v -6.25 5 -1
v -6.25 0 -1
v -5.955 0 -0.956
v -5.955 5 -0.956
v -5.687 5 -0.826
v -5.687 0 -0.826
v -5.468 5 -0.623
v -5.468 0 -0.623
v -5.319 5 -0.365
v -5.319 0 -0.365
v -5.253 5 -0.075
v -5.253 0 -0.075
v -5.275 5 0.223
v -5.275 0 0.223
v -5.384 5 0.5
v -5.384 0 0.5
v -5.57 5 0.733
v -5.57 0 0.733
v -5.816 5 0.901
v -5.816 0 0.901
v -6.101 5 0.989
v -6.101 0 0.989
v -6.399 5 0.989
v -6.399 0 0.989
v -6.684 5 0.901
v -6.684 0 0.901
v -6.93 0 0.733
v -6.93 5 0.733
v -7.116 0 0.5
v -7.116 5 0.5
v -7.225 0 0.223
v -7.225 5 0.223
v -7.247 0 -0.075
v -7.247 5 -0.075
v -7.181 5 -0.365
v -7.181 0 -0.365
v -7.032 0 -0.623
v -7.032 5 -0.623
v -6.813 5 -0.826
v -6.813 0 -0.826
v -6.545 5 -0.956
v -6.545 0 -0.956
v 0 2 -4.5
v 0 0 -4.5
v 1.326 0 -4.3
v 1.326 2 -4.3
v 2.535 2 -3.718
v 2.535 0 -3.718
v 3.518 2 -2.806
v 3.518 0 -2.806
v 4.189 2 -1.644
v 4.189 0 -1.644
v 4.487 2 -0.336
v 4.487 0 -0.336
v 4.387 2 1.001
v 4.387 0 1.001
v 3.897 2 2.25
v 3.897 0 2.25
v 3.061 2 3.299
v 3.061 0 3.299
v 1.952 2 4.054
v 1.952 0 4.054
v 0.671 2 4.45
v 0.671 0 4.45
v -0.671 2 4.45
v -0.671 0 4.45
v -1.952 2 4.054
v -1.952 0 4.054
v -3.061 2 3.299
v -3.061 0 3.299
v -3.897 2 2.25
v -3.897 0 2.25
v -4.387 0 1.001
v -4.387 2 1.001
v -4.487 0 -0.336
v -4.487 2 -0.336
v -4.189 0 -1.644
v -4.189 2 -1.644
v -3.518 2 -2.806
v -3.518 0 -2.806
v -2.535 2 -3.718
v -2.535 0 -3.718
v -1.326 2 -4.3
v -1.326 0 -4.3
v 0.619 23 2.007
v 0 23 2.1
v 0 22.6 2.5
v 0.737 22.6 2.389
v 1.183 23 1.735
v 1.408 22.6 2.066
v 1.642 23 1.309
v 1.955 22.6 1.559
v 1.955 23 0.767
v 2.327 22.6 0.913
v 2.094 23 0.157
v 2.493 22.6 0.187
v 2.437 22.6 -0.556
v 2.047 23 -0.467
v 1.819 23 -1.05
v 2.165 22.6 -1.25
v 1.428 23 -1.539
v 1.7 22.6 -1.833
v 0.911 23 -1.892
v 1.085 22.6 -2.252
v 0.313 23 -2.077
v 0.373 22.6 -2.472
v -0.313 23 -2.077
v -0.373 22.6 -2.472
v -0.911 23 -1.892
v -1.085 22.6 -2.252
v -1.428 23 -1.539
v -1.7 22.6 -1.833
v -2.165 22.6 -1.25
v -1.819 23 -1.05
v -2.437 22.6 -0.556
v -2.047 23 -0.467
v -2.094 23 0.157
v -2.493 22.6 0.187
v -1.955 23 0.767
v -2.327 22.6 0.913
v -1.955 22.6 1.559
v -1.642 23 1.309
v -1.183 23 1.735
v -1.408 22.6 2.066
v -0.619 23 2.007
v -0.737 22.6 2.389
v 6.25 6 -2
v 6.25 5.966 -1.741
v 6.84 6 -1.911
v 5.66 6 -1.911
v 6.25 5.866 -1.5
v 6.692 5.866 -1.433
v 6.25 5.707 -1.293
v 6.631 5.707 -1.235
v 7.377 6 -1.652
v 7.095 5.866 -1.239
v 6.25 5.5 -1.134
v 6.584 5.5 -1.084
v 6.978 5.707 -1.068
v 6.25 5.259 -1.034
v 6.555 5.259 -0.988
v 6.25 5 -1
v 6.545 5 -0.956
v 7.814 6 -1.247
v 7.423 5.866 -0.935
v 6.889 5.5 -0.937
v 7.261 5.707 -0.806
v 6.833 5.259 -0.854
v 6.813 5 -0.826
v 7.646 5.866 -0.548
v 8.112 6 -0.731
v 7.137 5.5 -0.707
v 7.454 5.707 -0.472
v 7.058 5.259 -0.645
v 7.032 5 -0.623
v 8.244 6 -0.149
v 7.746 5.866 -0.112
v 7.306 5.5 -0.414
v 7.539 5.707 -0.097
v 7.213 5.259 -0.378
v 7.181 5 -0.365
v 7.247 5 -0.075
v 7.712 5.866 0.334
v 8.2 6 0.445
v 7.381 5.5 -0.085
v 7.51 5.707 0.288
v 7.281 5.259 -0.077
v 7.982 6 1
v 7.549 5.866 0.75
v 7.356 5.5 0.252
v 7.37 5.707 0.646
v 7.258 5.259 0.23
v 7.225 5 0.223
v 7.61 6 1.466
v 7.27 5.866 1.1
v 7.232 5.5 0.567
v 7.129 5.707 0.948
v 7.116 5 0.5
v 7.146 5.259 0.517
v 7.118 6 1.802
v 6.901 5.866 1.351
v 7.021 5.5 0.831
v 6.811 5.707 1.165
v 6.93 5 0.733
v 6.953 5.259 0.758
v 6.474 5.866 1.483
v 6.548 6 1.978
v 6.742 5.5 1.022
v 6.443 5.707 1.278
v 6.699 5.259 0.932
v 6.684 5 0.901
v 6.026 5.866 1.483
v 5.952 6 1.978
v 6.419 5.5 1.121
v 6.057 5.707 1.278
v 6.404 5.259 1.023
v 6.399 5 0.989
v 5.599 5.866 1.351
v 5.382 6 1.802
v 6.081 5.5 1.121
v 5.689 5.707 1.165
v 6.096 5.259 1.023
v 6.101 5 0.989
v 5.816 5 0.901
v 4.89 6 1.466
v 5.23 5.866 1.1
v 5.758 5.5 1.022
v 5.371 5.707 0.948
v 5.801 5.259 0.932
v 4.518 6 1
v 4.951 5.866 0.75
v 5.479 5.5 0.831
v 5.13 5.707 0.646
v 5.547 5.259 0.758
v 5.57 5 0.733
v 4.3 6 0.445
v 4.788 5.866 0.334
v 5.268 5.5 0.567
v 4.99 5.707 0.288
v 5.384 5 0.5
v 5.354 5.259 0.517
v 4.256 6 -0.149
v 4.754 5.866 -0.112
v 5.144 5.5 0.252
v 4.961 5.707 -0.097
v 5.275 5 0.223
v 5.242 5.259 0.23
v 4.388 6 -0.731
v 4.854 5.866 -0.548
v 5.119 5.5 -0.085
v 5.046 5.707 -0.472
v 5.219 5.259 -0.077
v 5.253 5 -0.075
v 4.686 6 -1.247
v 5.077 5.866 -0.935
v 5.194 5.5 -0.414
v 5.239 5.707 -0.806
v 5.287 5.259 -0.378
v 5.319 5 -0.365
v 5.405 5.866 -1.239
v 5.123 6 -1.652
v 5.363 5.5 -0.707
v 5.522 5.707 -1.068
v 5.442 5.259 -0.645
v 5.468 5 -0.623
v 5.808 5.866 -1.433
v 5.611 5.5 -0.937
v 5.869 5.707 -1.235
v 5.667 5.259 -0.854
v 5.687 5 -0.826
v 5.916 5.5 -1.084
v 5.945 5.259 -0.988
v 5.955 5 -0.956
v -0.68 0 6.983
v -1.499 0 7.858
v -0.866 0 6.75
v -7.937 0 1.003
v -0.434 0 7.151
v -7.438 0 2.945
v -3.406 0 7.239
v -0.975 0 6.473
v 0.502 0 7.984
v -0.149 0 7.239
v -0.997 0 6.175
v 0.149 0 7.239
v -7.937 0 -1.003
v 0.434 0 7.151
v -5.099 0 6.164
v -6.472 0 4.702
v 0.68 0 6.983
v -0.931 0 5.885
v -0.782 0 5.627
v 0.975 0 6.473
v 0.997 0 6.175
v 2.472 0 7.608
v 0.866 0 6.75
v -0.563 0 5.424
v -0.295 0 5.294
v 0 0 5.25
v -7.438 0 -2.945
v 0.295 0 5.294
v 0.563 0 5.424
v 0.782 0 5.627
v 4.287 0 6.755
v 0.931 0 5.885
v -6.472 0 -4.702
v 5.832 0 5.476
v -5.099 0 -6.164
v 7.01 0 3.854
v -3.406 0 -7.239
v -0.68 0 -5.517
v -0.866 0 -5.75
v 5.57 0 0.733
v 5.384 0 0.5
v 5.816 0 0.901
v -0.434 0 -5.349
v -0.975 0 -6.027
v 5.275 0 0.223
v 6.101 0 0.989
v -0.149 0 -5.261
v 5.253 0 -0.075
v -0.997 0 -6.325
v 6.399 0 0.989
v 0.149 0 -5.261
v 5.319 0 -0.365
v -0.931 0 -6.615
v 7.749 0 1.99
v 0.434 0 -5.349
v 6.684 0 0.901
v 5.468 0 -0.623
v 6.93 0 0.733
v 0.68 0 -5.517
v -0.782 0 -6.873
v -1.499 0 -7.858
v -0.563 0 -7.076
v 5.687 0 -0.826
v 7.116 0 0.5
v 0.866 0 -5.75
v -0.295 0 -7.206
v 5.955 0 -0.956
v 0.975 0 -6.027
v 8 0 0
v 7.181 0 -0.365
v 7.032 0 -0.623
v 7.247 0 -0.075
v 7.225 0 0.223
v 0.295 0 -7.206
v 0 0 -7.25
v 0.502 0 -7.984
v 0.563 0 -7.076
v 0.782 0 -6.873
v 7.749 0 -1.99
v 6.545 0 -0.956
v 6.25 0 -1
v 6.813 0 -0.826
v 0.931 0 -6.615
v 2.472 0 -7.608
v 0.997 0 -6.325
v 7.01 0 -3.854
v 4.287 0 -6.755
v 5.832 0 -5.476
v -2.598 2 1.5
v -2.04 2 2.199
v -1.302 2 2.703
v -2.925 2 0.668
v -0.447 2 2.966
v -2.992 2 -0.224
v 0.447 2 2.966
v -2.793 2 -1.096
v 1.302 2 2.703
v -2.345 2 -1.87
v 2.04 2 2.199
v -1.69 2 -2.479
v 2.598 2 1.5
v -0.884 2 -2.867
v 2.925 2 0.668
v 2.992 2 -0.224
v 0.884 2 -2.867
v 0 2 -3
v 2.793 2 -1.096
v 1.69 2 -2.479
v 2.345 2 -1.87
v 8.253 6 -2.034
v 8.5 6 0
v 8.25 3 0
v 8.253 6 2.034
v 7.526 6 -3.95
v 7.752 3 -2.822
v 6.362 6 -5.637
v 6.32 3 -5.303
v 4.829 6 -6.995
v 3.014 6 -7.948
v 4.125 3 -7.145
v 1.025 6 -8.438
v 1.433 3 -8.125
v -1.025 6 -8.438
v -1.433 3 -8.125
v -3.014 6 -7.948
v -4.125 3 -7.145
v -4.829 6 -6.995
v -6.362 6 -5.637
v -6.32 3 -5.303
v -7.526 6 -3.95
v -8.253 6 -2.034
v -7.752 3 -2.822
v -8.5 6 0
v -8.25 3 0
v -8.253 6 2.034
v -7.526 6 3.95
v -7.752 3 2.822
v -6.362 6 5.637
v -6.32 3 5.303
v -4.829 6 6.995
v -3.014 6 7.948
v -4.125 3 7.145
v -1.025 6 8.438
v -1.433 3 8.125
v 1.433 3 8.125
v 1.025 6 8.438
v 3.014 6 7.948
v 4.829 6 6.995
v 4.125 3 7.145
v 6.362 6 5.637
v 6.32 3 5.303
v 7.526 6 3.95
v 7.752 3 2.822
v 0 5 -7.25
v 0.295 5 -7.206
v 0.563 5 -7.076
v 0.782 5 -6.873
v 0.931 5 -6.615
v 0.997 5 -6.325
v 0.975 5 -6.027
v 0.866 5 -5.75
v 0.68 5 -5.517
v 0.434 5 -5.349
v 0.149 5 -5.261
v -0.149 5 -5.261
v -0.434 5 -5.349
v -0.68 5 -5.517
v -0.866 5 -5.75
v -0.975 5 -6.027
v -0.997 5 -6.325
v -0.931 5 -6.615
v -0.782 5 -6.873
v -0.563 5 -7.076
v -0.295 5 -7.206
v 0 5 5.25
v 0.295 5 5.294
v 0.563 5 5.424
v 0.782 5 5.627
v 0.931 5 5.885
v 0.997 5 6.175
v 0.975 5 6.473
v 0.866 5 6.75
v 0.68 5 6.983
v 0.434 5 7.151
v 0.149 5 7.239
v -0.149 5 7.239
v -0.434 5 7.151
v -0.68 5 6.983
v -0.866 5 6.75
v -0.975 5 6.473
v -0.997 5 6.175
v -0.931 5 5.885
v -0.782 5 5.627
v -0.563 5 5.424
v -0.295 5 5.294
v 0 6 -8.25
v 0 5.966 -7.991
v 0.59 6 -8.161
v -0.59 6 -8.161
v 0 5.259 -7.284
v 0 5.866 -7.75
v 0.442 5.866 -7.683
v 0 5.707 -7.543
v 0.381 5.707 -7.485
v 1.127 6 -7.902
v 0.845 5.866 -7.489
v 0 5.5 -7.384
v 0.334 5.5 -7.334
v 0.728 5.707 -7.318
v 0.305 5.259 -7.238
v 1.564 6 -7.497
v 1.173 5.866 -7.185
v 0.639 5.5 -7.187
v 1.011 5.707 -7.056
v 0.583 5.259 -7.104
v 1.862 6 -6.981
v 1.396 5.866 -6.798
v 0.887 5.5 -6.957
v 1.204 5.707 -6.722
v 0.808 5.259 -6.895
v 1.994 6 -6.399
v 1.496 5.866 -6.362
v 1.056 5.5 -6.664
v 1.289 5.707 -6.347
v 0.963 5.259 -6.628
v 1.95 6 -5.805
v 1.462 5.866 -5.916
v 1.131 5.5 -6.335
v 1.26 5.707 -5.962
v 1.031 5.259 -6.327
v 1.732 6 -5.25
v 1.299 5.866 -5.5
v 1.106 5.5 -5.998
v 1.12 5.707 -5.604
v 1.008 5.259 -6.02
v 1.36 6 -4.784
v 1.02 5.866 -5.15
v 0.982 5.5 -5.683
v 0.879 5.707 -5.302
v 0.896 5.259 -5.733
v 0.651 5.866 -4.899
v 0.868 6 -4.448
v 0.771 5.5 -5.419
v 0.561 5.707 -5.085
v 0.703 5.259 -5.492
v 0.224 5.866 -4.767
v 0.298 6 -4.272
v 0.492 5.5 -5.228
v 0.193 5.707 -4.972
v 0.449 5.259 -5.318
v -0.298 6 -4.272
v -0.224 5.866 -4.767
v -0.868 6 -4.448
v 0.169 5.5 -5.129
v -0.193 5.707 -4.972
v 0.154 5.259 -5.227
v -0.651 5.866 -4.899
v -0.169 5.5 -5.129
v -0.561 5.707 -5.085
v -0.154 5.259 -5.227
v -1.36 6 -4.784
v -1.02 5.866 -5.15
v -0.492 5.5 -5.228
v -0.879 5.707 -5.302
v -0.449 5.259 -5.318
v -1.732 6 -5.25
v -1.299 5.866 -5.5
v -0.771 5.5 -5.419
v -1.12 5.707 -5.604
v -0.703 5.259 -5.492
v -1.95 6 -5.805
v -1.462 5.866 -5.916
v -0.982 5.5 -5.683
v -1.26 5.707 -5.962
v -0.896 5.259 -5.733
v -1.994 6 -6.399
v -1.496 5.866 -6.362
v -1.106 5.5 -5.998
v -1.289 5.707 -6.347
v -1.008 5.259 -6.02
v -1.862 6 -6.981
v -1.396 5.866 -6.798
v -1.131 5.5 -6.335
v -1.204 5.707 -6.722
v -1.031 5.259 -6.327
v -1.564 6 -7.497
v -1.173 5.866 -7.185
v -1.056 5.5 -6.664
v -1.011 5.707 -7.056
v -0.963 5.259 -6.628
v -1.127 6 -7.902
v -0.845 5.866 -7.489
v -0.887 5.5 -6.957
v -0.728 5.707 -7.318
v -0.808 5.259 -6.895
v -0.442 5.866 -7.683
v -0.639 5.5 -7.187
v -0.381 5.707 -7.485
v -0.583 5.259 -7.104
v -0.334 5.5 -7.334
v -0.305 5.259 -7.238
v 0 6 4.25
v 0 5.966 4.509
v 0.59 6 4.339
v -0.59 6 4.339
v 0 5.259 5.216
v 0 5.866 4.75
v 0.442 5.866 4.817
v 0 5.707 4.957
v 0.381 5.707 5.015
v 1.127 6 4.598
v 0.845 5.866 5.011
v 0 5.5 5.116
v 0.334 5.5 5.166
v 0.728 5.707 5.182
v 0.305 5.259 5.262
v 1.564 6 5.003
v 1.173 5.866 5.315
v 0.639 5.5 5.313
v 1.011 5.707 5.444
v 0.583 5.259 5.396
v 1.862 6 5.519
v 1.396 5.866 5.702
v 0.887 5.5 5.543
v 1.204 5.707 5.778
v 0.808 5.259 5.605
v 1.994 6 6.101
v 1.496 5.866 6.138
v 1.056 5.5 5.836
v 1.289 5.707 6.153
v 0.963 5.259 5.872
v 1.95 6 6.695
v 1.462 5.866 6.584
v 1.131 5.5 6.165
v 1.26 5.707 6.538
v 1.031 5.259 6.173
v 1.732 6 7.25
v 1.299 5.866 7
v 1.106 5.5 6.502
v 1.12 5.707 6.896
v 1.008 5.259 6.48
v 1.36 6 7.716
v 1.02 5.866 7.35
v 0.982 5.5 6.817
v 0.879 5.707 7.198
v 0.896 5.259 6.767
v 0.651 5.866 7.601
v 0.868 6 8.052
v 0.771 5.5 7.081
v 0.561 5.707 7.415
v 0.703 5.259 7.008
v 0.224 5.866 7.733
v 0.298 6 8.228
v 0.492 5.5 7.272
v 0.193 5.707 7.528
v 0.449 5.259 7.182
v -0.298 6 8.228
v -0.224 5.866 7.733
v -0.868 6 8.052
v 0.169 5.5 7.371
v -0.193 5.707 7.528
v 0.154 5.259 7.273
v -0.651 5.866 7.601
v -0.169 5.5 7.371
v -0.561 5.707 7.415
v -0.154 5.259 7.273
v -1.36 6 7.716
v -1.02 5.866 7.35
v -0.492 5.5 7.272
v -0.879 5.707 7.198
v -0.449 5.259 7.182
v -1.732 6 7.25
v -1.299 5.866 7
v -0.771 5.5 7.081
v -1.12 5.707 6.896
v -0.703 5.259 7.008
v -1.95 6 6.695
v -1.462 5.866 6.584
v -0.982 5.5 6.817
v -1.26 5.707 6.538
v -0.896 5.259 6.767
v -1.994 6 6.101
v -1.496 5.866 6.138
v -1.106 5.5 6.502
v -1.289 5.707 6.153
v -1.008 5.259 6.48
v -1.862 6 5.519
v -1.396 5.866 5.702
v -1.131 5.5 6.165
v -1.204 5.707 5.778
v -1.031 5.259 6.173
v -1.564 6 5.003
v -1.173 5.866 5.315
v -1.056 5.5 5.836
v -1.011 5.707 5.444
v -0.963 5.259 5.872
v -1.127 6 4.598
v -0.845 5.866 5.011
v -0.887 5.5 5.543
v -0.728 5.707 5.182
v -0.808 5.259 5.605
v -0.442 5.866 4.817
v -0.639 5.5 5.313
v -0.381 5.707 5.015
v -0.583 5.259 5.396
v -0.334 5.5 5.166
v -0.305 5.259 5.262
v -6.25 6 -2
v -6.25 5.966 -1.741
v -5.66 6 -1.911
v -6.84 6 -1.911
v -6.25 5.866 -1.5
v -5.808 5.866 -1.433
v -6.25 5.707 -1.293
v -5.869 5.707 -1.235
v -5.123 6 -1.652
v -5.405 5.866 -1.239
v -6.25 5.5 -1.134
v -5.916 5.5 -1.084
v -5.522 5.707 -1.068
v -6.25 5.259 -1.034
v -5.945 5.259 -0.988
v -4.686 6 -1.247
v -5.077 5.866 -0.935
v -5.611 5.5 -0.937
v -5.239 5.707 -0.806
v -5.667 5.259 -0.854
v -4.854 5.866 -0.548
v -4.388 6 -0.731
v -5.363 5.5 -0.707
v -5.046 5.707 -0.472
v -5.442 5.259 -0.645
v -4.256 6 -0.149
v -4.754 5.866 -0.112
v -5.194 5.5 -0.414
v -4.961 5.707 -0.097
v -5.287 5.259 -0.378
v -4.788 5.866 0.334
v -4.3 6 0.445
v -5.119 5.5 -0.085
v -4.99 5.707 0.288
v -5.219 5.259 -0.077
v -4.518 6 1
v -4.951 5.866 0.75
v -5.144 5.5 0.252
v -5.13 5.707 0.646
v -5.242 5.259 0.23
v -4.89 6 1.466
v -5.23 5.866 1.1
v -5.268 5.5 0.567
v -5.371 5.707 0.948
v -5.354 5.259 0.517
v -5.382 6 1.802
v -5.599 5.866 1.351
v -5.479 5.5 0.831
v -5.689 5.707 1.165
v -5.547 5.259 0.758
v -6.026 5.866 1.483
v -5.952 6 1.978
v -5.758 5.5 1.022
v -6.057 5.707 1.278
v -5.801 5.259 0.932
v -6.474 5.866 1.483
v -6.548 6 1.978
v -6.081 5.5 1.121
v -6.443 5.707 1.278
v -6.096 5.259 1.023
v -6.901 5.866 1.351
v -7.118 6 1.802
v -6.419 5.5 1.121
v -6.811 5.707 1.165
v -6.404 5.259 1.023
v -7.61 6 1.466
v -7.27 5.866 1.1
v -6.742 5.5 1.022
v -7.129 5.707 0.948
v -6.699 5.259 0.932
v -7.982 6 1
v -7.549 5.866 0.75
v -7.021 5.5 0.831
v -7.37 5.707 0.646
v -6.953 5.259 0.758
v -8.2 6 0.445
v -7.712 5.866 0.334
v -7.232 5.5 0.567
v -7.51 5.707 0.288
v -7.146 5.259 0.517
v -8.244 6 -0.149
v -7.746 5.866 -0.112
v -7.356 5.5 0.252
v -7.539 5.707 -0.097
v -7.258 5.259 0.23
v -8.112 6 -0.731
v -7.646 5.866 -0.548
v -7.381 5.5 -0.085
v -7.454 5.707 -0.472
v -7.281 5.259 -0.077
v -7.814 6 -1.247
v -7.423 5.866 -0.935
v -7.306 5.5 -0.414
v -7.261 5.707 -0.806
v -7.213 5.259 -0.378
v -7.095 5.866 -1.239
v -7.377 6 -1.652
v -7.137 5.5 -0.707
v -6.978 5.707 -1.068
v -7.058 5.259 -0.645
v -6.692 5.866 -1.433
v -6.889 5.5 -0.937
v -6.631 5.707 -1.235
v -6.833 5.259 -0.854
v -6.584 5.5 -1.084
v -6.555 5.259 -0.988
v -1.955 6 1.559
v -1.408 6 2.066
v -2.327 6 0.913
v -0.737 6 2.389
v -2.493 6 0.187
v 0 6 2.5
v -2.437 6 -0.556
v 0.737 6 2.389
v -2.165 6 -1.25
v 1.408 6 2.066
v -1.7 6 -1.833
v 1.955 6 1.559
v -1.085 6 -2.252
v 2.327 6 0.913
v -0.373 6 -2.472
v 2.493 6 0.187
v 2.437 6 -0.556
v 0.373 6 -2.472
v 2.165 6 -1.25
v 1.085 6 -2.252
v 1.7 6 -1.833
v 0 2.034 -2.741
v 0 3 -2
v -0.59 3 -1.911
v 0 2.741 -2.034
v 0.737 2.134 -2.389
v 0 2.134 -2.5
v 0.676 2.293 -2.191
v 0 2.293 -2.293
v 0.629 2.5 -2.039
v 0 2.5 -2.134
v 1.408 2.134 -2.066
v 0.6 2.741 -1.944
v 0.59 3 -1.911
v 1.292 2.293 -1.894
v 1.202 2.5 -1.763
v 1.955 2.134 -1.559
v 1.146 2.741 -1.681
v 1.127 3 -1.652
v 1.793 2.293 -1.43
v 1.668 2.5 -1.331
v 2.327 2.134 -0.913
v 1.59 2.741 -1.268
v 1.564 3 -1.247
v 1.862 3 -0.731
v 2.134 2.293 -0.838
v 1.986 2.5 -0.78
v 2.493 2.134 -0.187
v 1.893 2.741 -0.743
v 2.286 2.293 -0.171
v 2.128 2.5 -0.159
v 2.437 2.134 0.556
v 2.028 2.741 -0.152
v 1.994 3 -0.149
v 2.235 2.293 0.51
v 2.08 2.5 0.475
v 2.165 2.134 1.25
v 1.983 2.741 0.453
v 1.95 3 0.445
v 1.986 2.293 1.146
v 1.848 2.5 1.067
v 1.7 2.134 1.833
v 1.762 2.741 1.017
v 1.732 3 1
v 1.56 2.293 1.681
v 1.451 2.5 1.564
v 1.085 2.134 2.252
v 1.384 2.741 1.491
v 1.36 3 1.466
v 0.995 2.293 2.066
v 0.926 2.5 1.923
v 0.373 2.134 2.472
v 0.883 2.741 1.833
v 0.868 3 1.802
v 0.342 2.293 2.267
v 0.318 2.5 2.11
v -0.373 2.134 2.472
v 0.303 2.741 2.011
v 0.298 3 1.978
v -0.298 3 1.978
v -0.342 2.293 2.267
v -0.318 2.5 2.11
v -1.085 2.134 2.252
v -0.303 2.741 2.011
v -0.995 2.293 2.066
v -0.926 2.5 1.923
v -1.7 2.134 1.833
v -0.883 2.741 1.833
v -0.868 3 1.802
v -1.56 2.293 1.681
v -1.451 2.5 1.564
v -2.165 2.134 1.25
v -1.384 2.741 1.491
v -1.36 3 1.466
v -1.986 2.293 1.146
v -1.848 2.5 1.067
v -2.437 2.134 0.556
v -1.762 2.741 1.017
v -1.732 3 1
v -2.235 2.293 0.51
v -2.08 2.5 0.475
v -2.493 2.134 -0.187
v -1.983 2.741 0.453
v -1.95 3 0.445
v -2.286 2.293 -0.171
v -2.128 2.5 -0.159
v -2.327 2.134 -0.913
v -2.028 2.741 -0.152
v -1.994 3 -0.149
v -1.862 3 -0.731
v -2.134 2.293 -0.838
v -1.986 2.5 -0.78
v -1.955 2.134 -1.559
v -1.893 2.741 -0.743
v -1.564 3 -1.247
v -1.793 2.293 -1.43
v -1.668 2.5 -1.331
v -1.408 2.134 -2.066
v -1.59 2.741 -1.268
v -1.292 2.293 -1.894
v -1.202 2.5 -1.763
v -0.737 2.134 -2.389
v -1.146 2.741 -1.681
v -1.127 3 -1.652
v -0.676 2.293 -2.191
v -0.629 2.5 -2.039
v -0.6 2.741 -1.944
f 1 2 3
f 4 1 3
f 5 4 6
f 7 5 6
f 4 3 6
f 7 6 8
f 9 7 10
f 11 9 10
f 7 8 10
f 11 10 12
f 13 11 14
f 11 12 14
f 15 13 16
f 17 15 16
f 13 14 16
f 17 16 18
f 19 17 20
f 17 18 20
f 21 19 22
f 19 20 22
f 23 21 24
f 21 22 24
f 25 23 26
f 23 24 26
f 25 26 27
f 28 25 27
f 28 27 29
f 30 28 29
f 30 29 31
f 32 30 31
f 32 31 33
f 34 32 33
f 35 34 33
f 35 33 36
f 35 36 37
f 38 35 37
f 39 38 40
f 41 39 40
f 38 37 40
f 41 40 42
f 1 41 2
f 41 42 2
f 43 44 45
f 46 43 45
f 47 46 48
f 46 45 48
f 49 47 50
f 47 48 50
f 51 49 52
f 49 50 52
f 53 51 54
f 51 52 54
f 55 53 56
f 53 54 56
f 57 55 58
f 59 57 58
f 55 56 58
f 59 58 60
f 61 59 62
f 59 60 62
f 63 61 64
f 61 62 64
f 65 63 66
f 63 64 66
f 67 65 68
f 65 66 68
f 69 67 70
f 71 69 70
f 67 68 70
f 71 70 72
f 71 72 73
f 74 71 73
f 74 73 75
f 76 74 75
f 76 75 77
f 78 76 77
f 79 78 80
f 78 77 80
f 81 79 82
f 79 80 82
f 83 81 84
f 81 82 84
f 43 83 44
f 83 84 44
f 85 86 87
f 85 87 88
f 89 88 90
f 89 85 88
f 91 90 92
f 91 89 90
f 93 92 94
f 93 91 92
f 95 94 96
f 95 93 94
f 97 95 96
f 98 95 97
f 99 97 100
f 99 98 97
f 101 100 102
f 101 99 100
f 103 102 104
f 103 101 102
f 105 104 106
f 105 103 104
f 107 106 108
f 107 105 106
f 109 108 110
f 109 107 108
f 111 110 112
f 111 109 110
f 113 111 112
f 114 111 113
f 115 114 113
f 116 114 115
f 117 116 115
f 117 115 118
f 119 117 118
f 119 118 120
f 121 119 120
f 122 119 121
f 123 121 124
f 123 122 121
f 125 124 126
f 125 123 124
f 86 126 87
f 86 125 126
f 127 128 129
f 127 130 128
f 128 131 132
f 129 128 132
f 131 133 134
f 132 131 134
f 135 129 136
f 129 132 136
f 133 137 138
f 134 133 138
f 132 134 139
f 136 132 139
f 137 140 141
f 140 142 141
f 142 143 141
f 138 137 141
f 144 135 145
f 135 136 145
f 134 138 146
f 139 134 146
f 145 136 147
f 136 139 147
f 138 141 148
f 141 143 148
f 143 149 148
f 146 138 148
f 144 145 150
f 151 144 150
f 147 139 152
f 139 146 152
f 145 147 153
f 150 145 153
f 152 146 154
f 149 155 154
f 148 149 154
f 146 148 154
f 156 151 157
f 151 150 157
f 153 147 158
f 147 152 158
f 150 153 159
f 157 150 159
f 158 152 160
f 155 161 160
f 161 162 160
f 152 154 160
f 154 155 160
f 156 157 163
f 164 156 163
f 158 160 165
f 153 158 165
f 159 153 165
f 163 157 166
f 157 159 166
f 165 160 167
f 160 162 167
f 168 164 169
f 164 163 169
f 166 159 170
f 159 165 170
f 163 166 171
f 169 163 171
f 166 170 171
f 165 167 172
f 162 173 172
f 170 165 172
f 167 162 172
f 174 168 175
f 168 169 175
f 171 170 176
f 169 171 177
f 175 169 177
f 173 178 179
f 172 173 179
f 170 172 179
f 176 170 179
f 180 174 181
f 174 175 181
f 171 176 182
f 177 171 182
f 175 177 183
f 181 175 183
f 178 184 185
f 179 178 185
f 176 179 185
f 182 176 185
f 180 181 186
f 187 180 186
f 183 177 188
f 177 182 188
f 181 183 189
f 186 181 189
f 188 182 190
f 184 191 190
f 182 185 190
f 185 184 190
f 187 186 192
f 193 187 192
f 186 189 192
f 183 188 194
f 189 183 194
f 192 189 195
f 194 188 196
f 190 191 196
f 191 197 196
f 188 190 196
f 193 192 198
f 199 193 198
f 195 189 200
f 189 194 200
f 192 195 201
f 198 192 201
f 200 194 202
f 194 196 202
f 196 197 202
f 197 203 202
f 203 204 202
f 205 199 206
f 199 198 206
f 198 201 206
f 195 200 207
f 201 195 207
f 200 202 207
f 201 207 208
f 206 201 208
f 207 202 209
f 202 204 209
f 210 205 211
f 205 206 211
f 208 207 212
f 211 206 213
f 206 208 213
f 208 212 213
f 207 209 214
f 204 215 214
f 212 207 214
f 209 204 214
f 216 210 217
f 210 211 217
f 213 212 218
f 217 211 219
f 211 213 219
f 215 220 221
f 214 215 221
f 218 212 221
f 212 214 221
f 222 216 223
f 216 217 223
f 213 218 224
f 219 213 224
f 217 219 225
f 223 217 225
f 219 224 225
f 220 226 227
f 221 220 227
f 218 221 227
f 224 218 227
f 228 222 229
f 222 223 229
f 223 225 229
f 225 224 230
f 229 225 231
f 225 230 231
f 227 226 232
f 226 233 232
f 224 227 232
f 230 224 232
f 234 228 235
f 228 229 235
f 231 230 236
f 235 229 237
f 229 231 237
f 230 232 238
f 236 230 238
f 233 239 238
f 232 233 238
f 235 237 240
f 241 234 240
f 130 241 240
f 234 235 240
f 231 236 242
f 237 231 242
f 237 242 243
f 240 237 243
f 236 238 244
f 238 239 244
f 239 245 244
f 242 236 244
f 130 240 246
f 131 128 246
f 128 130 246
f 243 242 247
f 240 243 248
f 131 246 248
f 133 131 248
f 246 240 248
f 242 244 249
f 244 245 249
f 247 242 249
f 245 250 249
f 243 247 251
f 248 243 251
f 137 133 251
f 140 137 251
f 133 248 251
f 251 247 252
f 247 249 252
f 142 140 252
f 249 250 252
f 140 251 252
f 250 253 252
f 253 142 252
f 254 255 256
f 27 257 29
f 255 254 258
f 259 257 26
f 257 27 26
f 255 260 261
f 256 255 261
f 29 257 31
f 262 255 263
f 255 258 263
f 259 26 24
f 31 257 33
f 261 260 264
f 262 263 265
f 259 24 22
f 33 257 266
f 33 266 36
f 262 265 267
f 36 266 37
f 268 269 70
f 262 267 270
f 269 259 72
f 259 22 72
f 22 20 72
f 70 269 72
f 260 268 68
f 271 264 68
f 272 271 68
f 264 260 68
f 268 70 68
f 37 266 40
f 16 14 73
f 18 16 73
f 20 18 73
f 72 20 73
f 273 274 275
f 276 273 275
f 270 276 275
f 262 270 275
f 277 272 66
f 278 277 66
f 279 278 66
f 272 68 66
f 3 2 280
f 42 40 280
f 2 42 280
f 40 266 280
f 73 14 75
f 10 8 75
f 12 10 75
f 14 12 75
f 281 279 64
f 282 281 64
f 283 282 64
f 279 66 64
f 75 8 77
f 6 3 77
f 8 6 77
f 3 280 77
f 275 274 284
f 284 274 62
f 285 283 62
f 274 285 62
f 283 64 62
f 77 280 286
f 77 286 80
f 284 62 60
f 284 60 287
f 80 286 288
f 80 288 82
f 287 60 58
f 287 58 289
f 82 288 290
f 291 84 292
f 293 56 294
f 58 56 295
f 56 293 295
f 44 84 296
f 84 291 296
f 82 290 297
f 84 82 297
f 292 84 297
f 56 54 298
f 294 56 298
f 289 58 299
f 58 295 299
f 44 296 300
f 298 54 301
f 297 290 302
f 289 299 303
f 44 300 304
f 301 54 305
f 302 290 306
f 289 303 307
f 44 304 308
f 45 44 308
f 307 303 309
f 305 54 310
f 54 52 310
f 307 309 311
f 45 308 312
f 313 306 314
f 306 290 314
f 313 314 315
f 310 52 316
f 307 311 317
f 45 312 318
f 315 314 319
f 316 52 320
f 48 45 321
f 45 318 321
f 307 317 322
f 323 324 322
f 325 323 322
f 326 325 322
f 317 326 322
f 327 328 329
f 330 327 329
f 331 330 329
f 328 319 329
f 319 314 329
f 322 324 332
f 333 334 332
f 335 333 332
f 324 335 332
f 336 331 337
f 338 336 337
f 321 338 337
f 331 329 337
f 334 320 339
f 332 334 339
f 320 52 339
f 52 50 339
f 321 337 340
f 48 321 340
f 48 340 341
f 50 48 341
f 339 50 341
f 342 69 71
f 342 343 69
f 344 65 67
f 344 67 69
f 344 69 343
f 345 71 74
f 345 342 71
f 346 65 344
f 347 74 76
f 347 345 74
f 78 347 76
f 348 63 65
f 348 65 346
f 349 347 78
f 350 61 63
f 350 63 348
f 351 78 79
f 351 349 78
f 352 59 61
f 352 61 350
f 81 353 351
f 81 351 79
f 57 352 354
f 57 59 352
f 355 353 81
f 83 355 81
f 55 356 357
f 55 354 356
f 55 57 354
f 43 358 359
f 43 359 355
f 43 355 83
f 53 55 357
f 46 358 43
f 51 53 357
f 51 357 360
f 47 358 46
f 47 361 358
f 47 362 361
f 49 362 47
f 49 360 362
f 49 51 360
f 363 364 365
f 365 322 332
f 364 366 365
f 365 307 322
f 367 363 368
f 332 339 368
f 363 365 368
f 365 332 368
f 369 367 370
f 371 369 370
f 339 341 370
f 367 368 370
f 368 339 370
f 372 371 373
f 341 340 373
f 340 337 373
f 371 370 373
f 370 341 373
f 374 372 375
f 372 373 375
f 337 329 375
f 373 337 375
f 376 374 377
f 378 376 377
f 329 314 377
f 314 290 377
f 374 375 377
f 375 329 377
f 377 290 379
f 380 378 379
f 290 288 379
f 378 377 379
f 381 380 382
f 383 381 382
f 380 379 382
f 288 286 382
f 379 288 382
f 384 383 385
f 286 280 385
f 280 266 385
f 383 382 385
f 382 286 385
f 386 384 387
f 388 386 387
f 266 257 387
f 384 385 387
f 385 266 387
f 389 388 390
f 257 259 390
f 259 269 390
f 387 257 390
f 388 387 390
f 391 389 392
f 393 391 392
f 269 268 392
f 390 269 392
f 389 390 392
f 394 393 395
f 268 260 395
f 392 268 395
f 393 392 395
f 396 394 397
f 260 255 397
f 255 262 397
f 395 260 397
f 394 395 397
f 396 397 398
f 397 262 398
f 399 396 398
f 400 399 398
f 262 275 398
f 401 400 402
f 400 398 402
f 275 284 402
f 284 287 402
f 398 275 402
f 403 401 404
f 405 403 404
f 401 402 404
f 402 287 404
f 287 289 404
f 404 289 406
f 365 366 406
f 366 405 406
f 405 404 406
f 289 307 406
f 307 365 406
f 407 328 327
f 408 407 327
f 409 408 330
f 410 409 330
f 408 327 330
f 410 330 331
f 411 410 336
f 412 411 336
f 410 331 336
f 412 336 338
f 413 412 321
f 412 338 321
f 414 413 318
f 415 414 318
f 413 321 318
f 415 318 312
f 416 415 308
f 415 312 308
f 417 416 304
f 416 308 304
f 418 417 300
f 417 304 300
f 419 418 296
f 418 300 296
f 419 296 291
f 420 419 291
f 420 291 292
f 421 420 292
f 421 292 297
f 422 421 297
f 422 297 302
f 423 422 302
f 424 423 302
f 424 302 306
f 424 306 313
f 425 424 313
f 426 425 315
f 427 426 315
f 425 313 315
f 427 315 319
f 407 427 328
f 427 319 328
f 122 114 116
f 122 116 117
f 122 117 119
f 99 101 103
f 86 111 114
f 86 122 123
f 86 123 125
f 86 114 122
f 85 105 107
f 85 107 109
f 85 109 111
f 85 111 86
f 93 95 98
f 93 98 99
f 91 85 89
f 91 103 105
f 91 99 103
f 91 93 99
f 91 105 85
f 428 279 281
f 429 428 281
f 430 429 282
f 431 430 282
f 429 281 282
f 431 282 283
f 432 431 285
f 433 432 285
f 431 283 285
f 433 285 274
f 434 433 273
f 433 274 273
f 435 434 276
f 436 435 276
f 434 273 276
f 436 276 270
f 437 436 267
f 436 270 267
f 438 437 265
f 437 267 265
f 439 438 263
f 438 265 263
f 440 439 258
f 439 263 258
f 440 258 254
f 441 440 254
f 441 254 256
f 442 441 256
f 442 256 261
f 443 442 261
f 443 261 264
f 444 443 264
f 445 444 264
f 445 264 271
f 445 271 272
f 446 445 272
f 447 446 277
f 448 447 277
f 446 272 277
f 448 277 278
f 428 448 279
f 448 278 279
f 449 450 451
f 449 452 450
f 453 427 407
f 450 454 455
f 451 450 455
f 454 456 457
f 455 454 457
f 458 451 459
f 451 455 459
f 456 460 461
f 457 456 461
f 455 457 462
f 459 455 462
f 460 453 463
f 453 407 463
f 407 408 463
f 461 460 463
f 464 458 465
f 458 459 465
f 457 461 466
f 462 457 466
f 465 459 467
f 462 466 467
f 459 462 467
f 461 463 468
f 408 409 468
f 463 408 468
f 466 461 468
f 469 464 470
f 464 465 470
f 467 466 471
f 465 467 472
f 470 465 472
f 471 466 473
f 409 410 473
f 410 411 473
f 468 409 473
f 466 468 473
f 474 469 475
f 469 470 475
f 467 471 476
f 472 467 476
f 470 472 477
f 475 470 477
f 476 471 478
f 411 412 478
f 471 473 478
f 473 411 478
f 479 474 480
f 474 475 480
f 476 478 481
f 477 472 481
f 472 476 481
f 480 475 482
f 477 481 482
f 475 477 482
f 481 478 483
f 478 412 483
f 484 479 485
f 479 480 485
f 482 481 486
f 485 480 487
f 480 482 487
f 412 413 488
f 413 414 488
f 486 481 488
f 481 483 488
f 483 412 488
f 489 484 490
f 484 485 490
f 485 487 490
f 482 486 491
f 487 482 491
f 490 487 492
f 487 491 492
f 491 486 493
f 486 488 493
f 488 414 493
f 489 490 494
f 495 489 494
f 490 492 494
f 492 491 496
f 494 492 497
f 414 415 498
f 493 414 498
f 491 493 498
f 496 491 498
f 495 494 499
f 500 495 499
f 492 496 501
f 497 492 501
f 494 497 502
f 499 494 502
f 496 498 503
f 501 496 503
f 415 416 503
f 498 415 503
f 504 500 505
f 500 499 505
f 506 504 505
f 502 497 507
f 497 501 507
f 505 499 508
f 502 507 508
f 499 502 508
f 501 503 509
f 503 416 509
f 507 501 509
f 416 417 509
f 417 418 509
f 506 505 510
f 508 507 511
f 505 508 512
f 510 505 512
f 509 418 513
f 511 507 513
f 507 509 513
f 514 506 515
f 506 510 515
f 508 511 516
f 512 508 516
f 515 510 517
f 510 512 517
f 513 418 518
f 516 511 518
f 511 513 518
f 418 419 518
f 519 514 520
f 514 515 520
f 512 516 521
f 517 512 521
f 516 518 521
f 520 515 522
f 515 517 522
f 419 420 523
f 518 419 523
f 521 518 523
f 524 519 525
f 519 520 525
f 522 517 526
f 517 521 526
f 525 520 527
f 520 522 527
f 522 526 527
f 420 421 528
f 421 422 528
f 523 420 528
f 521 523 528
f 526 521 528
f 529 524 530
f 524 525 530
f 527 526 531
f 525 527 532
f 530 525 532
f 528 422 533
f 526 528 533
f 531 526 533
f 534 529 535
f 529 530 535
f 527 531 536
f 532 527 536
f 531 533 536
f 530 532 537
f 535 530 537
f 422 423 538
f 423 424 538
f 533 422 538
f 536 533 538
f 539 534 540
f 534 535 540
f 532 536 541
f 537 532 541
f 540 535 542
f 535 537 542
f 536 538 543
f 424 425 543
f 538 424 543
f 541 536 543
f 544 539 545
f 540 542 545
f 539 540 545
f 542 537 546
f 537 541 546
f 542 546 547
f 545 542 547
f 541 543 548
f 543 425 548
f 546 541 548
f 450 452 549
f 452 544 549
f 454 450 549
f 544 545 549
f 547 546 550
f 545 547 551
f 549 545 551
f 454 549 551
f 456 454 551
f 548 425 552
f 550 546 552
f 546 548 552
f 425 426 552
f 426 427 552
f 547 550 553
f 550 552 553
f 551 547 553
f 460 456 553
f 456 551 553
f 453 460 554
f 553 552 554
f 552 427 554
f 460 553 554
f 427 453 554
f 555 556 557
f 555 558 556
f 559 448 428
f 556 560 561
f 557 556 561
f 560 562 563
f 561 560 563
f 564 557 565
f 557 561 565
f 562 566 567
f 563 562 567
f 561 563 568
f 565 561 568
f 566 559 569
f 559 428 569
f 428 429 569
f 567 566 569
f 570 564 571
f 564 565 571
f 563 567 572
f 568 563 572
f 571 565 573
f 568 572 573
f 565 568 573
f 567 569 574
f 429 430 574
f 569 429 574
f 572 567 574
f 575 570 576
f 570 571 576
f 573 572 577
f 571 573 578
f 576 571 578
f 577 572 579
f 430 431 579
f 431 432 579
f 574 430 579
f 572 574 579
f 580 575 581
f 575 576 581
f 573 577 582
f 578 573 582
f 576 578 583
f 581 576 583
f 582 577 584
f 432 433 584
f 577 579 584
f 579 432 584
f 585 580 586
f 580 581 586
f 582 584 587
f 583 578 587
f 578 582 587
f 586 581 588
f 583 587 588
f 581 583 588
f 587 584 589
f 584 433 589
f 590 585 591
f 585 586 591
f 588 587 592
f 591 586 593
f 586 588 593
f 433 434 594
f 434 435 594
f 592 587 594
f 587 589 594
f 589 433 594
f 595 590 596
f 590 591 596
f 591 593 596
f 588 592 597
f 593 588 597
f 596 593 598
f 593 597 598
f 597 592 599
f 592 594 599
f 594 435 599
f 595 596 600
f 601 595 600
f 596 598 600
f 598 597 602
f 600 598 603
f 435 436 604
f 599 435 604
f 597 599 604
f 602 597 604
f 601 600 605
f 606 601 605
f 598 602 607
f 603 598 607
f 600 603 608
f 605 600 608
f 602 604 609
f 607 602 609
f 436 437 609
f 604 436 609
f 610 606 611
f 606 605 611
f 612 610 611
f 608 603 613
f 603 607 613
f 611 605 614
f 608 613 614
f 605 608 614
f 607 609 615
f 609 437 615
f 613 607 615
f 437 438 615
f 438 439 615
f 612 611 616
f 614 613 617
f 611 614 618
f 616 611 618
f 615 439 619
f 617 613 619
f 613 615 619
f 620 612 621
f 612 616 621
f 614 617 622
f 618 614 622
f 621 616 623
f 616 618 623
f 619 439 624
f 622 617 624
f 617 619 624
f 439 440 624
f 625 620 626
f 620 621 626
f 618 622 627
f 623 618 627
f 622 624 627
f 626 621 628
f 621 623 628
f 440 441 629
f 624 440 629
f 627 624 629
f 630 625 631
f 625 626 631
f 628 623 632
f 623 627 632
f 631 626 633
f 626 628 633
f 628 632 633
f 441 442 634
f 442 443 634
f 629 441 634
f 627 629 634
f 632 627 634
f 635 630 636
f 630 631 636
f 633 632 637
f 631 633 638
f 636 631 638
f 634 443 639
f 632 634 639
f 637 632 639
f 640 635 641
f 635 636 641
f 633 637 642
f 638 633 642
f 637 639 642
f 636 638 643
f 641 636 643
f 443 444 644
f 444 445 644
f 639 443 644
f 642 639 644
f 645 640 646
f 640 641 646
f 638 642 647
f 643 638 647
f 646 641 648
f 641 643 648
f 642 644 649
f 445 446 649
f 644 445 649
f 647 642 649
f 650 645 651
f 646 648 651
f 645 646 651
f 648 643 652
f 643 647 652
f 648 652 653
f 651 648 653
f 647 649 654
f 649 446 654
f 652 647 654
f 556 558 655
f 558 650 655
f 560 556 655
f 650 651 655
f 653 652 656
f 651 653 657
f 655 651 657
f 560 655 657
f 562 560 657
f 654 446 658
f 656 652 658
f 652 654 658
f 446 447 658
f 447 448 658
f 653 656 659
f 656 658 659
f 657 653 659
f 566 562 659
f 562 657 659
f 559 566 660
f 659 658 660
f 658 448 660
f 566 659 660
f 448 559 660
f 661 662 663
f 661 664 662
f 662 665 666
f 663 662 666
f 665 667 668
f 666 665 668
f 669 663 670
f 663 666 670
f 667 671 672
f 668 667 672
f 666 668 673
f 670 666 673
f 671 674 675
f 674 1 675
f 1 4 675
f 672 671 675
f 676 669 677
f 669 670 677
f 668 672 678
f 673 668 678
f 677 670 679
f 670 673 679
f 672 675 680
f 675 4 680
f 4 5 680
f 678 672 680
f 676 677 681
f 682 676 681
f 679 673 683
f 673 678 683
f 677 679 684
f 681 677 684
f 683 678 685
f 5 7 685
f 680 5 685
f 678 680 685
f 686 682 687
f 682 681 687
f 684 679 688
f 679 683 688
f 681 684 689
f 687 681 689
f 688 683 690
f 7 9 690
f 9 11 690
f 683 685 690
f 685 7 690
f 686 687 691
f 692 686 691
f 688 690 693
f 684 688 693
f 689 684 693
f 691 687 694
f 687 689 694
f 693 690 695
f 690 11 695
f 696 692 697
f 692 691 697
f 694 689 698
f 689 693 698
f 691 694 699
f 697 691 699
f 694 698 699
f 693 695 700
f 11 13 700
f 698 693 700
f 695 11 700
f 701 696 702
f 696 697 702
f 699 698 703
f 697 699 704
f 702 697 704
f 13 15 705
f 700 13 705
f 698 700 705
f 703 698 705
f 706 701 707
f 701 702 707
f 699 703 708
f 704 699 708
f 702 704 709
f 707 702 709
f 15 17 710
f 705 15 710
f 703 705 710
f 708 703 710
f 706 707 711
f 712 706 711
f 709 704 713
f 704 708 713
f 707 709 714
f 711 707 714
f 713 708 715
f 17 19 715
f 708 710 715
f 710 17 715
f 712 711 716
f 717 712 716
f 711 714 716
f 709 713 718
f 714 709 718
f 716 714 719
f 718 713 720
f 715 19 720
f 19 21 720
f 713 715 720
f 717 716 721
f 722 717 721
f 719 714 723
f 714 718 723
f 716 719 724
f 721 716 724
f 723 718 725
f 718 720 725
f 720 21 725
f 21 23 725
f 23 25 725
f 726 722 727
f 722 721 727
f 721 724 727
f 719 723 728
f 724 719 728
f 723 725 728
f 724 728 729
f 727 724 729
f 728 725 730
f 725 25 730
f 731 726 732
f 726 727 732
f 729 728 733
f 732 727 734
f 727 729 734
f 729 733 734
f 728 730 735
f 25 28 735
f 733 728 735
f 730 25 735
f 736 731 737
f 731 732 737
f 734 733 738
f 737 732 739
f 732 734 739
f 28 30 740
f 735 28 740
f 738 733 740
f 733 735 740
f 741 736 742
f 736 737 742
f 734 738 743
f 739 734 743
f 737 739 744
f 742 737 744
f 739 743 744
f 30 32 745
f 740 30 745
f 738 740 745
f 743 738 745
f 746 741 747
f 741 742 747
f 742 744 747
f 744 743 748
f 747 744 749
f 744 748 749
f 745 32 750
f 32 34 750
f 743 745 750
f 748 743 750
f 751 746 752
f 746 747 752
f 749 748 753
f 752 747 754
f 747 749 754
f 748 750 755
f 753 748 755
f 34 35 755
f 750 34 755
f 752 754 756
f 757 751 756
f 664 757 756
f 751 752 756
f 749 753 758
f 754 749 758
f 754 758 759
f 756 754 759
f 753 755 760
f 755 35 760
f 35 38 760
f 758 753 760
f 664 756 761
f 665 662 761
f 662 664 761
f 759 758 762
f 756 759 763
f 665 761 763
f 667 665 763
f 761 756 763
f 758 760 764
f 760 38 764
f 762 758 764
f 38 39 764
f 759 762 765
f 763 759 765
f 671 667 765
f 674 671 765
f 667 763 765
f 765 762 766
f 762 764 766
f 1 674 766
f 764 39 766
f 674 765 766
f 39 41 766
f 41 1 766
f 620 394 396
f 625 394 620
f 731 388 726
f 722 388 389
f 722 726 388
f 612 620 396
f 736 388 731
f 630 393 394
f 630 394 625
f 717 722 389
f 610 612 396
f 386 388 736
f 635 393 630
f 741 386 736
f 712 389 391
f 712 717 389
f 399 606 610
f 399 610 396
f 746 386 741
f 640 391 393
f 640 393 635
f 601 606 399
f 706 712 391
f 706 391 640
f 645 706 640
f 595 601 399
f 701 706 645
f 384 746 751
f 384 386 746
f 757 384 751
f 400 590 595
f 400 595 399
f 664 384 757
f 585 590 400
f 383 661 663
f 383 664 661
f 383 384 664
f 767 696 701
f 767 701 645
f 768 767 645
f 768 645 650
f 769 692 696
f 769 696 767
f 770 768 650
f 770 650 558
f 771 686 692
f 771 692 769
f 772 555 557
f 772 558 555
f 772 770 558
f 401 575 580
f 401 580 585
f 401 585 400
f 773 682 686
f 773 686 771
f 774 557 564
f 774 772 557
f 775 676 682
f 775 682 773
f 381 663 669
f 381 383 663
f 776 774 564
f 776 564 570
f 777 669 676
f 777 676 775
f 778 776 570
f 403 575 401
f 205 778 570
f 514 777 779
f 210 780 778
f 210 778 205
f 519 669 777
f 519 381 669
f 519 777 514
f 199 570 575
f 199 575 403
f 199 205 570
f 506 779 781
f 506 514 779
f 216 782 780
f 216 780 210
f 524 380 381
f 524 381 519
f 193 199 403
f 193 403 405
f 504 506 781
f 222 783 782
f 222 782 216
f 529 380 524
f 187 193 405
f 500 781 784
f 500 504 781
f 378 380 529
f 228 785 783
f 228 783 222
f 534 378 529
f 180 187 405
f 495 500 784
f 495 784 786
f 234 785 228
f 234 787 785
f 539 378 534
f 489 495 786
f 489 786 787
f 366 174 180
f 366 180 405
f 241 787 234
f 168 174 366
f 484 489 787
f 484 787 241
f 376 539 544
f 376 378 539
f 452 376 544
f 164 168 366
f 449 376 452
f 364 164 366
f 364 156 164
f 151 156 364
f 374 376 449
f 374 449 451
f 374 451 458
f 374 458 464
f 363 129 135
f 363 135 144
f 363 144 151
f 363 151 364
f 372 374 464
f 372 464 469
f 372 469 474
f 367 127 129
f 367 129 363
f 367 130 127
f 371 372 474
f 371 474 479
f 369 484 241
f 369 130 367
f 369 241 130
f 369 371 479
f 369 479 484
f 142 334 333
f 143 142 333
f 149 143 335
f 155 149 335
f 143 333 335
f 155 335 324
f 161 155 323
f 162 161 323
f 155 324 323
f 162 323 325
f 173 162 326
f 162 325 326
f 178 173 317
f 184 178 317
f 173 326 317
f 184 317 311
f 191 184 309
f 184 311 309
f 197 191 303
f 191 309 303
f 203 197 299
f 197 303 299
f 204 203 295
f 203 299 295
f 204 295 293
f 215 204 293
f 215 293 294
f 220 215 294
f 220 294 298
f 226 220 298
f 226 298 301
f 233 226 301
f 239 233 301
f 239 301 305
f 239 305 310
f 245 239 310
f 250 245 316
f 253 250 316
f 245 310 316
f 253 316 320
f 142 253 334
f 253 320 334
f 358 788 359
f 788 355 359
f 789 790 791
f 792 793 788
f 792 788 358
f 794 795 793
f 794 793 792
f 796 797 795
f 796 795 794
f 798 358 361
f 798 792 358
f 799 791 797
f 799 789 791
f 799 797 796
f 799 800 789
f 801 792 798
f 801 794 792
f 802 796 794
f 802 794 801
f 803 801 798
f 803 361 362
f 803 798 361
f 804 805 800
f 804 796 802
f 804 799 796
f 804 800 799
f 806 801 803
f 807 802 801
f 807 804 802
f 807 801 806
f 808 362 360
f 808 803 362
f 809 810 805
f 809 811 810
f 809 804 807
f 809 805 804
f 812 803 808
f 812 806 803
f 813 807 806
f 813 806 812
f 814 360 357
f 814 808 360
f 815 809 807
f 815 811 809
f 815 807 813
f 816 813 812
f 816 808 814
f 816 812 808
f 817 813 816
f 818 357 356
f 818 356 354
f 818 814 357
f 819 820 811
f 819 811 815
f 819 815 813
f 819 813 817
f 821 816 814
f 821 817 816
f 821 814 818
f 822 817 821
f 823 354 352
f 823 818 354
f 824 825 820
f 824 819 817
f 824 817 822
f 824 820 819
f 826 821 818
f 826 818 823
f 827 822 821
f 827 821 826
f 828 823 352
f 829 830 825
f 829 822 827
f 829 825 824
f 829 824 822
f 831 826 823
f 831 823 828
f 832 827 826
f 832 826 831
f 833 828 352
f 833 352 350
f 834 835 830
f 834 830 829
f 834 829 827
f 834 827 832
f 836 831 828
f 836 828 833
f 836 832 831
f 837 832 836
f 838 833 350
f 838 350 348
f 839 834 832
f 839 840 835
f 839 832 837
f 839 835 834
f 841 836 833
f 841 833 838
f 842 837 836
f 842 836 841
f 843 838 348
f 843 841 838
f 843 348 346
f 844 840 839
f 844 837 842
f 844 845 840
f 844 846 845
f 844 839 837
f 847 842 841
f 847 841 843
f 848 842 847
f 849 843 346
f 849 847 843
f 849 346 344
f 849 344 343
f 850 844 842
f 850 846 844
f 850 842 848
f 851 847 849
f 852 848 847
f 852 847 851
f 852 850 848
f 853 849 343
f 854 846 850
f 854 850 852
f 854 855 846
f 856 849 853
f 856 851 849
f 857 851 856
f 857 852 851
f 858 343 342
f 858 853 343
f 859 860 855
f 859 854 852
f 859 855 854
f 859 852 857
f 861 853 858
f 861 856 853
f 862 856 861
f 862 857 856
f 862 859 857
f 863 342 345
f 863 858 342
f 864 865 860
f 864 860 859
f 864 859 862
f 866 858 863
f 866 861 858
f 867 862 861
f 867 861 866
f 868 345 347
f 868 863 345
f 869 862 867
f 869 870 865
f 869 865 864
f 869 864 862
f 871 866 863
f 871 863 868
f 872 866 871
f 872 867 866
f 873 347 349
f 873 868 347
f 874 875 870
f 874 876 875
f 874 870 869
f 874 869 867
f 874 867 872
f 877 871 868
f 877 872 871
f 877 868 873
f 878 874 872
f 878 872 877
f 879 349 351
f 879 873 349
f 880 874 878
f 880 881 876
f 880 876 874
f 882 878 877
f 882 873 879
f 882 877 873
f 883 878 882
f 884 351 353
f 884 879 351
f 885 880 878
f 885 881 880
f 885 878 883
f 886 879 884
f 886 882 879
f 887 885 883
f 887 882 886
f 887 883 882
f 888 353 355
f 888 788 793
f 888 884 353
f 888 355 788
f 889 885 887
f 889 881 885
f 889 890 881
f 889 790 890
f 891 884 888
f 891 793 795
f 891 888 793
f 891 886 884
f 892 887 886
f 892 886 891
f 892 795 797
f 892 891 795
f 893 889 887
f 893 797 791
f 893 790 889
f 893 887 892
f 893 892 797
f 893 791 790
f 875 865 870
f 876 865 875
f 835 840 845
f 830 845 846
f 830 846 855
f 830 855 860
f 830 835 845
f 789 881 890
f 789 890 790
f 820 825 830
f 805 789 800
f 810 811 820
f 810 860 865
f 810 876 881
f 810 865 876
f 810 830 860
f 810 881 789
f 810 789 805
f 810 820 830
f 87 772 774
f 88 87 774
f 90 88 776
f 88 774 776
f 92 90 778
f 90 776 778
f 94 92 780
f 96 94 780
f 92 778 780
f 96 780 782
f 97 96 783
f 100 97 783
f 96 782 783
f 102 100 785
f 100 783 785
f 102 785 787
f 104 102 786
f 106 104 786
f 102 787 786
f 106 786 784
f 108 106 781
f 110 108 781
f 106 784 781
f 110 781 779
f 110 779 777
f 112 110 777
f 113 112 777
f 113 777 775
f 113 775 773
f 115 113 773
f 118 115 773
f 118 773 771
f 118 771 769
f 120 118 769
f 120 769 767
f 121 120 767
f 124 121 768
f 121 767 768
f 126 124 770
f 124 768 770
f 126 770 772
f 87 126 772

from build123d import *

# Parameters (mm, degrees)
SKETCH3_R           = 8.5
SKETCH1_R           = 8
SKETCH4_R           = 2.5
BOSS_EXTRUDE1_DEPTH = 17
SKETCH5_R           = 4.5
CUT_EXTRUDE1_DEPTH  = 2
SKETCH6_R           = 1
CUT_EXTRUDE4_DEPTH  = 6
SKETCH8_R           = 2
CUT_EXTRUDE5_DEPTH  = 1
FILLET1_R           = 1
CHAMFER1_SIZE       = 0.4
FILLET2_R           = 1


with BuildPart() as part:
    # Sketch3 → Loft1 section 0
    with BuildSketch(Plane(origin=(0, 6, 0), x_dir=(1, 0, 0), z_dir=(0, 1, 0))):
        Circle(SKETCH3_R)
    # Sketch1 → Loft1 section 1
    with BuildSketch(Plane(origin=(0, 0, 0), x_dir=(1, 0, 0), z_dir=(0, 1, 0))):
        Circle(SKETCH1_R)
    loft()

    # Sketch4 → Boss-Extrude1 (add)
    with BuildSketch(Plane(origin=(0, 6, 0), x_dir=(1, 0, 0), z_dir=(0, 1, 0))):
        with Locations(Location((0, 0, 0), (0, 0, 270))):
            Circle(SKETCH4_R)
    extrude(amount=BOSS_EXTRUDE1_DEPTH)

    # Sketch5 → Cut-Extrude1 (cut)
    with BuildSketch(Plane.XZ):
        with Locations(Location((0, 0, 0), (0, 0, 270))):
            Circle(SKETCH5_R)
    extrude(amount=-CUT_EXTRUDE1_DEPTH, mode=Mode.SUBTRACT)

    # Sketch6 → Cut-Extrude4 (cut)
    with BuildSketch(Plane.XZ):
        with Locations(Location((0, 6.25, 0), (0, 0, 270))):
            Circle(SKETCH6_R)
        with Locations(Location((6.25, 0, 0), (0, 0, 270))):
            Circle(SKETCH6_R)
        with Locations(Location((0, -6.25, 0), (0, 0, 270))):
            Circle(SKETCH6_R)
        with Locations(Location((-6.25, 0, 0), (0, 0, 270))):
            Circle(SKETCH6_R)
    extrude(amount=-CUT_EXTRUDE4_DEPTH, mode=Mode.SUBTRACT)

    # Sketch8 → Cut-Extrude5 (cut)
    with BuildSketch(Plane.XZ.offset(-2)):
        with Locations(Location((0, 0, 0), (0, 0, 270))):
            Circle(SKETCH8_R)
    extrude(amount=-CUT_EXTRUDE5_DEPTH, mode=Mode.SUBTRACT)

    # Fillet1
    fillet1_edges = [part.edges().sort_by_distance(p)[0] for p in [
        (0, 2, 2),
    ]]
    fillet(fillet1_edges, radius=FILLET1_R - 0.0001)  # a hair under: the kernel refuses the full size

    # Chamfer1
    chamfer1_edges = [part.edges().sort_by_distance(p)[0] for p in [
        (0, 23, -2.5),
    ]]
    chamfer(chamfer1_edges, length=CHAMFER1_SIZE)

    # Fillet2
    fillet2_edges = [part.edges().sort_by_distance(p)[0] for p in [
        (0, 6, 7.25),
        (6.25, 6, 1),
        (0, 6, -5.25),
        (-6.25, 6, 1),
    ]]
    fillet(fillet2_edges, radius=FILLET2_R)


solid = part.part
